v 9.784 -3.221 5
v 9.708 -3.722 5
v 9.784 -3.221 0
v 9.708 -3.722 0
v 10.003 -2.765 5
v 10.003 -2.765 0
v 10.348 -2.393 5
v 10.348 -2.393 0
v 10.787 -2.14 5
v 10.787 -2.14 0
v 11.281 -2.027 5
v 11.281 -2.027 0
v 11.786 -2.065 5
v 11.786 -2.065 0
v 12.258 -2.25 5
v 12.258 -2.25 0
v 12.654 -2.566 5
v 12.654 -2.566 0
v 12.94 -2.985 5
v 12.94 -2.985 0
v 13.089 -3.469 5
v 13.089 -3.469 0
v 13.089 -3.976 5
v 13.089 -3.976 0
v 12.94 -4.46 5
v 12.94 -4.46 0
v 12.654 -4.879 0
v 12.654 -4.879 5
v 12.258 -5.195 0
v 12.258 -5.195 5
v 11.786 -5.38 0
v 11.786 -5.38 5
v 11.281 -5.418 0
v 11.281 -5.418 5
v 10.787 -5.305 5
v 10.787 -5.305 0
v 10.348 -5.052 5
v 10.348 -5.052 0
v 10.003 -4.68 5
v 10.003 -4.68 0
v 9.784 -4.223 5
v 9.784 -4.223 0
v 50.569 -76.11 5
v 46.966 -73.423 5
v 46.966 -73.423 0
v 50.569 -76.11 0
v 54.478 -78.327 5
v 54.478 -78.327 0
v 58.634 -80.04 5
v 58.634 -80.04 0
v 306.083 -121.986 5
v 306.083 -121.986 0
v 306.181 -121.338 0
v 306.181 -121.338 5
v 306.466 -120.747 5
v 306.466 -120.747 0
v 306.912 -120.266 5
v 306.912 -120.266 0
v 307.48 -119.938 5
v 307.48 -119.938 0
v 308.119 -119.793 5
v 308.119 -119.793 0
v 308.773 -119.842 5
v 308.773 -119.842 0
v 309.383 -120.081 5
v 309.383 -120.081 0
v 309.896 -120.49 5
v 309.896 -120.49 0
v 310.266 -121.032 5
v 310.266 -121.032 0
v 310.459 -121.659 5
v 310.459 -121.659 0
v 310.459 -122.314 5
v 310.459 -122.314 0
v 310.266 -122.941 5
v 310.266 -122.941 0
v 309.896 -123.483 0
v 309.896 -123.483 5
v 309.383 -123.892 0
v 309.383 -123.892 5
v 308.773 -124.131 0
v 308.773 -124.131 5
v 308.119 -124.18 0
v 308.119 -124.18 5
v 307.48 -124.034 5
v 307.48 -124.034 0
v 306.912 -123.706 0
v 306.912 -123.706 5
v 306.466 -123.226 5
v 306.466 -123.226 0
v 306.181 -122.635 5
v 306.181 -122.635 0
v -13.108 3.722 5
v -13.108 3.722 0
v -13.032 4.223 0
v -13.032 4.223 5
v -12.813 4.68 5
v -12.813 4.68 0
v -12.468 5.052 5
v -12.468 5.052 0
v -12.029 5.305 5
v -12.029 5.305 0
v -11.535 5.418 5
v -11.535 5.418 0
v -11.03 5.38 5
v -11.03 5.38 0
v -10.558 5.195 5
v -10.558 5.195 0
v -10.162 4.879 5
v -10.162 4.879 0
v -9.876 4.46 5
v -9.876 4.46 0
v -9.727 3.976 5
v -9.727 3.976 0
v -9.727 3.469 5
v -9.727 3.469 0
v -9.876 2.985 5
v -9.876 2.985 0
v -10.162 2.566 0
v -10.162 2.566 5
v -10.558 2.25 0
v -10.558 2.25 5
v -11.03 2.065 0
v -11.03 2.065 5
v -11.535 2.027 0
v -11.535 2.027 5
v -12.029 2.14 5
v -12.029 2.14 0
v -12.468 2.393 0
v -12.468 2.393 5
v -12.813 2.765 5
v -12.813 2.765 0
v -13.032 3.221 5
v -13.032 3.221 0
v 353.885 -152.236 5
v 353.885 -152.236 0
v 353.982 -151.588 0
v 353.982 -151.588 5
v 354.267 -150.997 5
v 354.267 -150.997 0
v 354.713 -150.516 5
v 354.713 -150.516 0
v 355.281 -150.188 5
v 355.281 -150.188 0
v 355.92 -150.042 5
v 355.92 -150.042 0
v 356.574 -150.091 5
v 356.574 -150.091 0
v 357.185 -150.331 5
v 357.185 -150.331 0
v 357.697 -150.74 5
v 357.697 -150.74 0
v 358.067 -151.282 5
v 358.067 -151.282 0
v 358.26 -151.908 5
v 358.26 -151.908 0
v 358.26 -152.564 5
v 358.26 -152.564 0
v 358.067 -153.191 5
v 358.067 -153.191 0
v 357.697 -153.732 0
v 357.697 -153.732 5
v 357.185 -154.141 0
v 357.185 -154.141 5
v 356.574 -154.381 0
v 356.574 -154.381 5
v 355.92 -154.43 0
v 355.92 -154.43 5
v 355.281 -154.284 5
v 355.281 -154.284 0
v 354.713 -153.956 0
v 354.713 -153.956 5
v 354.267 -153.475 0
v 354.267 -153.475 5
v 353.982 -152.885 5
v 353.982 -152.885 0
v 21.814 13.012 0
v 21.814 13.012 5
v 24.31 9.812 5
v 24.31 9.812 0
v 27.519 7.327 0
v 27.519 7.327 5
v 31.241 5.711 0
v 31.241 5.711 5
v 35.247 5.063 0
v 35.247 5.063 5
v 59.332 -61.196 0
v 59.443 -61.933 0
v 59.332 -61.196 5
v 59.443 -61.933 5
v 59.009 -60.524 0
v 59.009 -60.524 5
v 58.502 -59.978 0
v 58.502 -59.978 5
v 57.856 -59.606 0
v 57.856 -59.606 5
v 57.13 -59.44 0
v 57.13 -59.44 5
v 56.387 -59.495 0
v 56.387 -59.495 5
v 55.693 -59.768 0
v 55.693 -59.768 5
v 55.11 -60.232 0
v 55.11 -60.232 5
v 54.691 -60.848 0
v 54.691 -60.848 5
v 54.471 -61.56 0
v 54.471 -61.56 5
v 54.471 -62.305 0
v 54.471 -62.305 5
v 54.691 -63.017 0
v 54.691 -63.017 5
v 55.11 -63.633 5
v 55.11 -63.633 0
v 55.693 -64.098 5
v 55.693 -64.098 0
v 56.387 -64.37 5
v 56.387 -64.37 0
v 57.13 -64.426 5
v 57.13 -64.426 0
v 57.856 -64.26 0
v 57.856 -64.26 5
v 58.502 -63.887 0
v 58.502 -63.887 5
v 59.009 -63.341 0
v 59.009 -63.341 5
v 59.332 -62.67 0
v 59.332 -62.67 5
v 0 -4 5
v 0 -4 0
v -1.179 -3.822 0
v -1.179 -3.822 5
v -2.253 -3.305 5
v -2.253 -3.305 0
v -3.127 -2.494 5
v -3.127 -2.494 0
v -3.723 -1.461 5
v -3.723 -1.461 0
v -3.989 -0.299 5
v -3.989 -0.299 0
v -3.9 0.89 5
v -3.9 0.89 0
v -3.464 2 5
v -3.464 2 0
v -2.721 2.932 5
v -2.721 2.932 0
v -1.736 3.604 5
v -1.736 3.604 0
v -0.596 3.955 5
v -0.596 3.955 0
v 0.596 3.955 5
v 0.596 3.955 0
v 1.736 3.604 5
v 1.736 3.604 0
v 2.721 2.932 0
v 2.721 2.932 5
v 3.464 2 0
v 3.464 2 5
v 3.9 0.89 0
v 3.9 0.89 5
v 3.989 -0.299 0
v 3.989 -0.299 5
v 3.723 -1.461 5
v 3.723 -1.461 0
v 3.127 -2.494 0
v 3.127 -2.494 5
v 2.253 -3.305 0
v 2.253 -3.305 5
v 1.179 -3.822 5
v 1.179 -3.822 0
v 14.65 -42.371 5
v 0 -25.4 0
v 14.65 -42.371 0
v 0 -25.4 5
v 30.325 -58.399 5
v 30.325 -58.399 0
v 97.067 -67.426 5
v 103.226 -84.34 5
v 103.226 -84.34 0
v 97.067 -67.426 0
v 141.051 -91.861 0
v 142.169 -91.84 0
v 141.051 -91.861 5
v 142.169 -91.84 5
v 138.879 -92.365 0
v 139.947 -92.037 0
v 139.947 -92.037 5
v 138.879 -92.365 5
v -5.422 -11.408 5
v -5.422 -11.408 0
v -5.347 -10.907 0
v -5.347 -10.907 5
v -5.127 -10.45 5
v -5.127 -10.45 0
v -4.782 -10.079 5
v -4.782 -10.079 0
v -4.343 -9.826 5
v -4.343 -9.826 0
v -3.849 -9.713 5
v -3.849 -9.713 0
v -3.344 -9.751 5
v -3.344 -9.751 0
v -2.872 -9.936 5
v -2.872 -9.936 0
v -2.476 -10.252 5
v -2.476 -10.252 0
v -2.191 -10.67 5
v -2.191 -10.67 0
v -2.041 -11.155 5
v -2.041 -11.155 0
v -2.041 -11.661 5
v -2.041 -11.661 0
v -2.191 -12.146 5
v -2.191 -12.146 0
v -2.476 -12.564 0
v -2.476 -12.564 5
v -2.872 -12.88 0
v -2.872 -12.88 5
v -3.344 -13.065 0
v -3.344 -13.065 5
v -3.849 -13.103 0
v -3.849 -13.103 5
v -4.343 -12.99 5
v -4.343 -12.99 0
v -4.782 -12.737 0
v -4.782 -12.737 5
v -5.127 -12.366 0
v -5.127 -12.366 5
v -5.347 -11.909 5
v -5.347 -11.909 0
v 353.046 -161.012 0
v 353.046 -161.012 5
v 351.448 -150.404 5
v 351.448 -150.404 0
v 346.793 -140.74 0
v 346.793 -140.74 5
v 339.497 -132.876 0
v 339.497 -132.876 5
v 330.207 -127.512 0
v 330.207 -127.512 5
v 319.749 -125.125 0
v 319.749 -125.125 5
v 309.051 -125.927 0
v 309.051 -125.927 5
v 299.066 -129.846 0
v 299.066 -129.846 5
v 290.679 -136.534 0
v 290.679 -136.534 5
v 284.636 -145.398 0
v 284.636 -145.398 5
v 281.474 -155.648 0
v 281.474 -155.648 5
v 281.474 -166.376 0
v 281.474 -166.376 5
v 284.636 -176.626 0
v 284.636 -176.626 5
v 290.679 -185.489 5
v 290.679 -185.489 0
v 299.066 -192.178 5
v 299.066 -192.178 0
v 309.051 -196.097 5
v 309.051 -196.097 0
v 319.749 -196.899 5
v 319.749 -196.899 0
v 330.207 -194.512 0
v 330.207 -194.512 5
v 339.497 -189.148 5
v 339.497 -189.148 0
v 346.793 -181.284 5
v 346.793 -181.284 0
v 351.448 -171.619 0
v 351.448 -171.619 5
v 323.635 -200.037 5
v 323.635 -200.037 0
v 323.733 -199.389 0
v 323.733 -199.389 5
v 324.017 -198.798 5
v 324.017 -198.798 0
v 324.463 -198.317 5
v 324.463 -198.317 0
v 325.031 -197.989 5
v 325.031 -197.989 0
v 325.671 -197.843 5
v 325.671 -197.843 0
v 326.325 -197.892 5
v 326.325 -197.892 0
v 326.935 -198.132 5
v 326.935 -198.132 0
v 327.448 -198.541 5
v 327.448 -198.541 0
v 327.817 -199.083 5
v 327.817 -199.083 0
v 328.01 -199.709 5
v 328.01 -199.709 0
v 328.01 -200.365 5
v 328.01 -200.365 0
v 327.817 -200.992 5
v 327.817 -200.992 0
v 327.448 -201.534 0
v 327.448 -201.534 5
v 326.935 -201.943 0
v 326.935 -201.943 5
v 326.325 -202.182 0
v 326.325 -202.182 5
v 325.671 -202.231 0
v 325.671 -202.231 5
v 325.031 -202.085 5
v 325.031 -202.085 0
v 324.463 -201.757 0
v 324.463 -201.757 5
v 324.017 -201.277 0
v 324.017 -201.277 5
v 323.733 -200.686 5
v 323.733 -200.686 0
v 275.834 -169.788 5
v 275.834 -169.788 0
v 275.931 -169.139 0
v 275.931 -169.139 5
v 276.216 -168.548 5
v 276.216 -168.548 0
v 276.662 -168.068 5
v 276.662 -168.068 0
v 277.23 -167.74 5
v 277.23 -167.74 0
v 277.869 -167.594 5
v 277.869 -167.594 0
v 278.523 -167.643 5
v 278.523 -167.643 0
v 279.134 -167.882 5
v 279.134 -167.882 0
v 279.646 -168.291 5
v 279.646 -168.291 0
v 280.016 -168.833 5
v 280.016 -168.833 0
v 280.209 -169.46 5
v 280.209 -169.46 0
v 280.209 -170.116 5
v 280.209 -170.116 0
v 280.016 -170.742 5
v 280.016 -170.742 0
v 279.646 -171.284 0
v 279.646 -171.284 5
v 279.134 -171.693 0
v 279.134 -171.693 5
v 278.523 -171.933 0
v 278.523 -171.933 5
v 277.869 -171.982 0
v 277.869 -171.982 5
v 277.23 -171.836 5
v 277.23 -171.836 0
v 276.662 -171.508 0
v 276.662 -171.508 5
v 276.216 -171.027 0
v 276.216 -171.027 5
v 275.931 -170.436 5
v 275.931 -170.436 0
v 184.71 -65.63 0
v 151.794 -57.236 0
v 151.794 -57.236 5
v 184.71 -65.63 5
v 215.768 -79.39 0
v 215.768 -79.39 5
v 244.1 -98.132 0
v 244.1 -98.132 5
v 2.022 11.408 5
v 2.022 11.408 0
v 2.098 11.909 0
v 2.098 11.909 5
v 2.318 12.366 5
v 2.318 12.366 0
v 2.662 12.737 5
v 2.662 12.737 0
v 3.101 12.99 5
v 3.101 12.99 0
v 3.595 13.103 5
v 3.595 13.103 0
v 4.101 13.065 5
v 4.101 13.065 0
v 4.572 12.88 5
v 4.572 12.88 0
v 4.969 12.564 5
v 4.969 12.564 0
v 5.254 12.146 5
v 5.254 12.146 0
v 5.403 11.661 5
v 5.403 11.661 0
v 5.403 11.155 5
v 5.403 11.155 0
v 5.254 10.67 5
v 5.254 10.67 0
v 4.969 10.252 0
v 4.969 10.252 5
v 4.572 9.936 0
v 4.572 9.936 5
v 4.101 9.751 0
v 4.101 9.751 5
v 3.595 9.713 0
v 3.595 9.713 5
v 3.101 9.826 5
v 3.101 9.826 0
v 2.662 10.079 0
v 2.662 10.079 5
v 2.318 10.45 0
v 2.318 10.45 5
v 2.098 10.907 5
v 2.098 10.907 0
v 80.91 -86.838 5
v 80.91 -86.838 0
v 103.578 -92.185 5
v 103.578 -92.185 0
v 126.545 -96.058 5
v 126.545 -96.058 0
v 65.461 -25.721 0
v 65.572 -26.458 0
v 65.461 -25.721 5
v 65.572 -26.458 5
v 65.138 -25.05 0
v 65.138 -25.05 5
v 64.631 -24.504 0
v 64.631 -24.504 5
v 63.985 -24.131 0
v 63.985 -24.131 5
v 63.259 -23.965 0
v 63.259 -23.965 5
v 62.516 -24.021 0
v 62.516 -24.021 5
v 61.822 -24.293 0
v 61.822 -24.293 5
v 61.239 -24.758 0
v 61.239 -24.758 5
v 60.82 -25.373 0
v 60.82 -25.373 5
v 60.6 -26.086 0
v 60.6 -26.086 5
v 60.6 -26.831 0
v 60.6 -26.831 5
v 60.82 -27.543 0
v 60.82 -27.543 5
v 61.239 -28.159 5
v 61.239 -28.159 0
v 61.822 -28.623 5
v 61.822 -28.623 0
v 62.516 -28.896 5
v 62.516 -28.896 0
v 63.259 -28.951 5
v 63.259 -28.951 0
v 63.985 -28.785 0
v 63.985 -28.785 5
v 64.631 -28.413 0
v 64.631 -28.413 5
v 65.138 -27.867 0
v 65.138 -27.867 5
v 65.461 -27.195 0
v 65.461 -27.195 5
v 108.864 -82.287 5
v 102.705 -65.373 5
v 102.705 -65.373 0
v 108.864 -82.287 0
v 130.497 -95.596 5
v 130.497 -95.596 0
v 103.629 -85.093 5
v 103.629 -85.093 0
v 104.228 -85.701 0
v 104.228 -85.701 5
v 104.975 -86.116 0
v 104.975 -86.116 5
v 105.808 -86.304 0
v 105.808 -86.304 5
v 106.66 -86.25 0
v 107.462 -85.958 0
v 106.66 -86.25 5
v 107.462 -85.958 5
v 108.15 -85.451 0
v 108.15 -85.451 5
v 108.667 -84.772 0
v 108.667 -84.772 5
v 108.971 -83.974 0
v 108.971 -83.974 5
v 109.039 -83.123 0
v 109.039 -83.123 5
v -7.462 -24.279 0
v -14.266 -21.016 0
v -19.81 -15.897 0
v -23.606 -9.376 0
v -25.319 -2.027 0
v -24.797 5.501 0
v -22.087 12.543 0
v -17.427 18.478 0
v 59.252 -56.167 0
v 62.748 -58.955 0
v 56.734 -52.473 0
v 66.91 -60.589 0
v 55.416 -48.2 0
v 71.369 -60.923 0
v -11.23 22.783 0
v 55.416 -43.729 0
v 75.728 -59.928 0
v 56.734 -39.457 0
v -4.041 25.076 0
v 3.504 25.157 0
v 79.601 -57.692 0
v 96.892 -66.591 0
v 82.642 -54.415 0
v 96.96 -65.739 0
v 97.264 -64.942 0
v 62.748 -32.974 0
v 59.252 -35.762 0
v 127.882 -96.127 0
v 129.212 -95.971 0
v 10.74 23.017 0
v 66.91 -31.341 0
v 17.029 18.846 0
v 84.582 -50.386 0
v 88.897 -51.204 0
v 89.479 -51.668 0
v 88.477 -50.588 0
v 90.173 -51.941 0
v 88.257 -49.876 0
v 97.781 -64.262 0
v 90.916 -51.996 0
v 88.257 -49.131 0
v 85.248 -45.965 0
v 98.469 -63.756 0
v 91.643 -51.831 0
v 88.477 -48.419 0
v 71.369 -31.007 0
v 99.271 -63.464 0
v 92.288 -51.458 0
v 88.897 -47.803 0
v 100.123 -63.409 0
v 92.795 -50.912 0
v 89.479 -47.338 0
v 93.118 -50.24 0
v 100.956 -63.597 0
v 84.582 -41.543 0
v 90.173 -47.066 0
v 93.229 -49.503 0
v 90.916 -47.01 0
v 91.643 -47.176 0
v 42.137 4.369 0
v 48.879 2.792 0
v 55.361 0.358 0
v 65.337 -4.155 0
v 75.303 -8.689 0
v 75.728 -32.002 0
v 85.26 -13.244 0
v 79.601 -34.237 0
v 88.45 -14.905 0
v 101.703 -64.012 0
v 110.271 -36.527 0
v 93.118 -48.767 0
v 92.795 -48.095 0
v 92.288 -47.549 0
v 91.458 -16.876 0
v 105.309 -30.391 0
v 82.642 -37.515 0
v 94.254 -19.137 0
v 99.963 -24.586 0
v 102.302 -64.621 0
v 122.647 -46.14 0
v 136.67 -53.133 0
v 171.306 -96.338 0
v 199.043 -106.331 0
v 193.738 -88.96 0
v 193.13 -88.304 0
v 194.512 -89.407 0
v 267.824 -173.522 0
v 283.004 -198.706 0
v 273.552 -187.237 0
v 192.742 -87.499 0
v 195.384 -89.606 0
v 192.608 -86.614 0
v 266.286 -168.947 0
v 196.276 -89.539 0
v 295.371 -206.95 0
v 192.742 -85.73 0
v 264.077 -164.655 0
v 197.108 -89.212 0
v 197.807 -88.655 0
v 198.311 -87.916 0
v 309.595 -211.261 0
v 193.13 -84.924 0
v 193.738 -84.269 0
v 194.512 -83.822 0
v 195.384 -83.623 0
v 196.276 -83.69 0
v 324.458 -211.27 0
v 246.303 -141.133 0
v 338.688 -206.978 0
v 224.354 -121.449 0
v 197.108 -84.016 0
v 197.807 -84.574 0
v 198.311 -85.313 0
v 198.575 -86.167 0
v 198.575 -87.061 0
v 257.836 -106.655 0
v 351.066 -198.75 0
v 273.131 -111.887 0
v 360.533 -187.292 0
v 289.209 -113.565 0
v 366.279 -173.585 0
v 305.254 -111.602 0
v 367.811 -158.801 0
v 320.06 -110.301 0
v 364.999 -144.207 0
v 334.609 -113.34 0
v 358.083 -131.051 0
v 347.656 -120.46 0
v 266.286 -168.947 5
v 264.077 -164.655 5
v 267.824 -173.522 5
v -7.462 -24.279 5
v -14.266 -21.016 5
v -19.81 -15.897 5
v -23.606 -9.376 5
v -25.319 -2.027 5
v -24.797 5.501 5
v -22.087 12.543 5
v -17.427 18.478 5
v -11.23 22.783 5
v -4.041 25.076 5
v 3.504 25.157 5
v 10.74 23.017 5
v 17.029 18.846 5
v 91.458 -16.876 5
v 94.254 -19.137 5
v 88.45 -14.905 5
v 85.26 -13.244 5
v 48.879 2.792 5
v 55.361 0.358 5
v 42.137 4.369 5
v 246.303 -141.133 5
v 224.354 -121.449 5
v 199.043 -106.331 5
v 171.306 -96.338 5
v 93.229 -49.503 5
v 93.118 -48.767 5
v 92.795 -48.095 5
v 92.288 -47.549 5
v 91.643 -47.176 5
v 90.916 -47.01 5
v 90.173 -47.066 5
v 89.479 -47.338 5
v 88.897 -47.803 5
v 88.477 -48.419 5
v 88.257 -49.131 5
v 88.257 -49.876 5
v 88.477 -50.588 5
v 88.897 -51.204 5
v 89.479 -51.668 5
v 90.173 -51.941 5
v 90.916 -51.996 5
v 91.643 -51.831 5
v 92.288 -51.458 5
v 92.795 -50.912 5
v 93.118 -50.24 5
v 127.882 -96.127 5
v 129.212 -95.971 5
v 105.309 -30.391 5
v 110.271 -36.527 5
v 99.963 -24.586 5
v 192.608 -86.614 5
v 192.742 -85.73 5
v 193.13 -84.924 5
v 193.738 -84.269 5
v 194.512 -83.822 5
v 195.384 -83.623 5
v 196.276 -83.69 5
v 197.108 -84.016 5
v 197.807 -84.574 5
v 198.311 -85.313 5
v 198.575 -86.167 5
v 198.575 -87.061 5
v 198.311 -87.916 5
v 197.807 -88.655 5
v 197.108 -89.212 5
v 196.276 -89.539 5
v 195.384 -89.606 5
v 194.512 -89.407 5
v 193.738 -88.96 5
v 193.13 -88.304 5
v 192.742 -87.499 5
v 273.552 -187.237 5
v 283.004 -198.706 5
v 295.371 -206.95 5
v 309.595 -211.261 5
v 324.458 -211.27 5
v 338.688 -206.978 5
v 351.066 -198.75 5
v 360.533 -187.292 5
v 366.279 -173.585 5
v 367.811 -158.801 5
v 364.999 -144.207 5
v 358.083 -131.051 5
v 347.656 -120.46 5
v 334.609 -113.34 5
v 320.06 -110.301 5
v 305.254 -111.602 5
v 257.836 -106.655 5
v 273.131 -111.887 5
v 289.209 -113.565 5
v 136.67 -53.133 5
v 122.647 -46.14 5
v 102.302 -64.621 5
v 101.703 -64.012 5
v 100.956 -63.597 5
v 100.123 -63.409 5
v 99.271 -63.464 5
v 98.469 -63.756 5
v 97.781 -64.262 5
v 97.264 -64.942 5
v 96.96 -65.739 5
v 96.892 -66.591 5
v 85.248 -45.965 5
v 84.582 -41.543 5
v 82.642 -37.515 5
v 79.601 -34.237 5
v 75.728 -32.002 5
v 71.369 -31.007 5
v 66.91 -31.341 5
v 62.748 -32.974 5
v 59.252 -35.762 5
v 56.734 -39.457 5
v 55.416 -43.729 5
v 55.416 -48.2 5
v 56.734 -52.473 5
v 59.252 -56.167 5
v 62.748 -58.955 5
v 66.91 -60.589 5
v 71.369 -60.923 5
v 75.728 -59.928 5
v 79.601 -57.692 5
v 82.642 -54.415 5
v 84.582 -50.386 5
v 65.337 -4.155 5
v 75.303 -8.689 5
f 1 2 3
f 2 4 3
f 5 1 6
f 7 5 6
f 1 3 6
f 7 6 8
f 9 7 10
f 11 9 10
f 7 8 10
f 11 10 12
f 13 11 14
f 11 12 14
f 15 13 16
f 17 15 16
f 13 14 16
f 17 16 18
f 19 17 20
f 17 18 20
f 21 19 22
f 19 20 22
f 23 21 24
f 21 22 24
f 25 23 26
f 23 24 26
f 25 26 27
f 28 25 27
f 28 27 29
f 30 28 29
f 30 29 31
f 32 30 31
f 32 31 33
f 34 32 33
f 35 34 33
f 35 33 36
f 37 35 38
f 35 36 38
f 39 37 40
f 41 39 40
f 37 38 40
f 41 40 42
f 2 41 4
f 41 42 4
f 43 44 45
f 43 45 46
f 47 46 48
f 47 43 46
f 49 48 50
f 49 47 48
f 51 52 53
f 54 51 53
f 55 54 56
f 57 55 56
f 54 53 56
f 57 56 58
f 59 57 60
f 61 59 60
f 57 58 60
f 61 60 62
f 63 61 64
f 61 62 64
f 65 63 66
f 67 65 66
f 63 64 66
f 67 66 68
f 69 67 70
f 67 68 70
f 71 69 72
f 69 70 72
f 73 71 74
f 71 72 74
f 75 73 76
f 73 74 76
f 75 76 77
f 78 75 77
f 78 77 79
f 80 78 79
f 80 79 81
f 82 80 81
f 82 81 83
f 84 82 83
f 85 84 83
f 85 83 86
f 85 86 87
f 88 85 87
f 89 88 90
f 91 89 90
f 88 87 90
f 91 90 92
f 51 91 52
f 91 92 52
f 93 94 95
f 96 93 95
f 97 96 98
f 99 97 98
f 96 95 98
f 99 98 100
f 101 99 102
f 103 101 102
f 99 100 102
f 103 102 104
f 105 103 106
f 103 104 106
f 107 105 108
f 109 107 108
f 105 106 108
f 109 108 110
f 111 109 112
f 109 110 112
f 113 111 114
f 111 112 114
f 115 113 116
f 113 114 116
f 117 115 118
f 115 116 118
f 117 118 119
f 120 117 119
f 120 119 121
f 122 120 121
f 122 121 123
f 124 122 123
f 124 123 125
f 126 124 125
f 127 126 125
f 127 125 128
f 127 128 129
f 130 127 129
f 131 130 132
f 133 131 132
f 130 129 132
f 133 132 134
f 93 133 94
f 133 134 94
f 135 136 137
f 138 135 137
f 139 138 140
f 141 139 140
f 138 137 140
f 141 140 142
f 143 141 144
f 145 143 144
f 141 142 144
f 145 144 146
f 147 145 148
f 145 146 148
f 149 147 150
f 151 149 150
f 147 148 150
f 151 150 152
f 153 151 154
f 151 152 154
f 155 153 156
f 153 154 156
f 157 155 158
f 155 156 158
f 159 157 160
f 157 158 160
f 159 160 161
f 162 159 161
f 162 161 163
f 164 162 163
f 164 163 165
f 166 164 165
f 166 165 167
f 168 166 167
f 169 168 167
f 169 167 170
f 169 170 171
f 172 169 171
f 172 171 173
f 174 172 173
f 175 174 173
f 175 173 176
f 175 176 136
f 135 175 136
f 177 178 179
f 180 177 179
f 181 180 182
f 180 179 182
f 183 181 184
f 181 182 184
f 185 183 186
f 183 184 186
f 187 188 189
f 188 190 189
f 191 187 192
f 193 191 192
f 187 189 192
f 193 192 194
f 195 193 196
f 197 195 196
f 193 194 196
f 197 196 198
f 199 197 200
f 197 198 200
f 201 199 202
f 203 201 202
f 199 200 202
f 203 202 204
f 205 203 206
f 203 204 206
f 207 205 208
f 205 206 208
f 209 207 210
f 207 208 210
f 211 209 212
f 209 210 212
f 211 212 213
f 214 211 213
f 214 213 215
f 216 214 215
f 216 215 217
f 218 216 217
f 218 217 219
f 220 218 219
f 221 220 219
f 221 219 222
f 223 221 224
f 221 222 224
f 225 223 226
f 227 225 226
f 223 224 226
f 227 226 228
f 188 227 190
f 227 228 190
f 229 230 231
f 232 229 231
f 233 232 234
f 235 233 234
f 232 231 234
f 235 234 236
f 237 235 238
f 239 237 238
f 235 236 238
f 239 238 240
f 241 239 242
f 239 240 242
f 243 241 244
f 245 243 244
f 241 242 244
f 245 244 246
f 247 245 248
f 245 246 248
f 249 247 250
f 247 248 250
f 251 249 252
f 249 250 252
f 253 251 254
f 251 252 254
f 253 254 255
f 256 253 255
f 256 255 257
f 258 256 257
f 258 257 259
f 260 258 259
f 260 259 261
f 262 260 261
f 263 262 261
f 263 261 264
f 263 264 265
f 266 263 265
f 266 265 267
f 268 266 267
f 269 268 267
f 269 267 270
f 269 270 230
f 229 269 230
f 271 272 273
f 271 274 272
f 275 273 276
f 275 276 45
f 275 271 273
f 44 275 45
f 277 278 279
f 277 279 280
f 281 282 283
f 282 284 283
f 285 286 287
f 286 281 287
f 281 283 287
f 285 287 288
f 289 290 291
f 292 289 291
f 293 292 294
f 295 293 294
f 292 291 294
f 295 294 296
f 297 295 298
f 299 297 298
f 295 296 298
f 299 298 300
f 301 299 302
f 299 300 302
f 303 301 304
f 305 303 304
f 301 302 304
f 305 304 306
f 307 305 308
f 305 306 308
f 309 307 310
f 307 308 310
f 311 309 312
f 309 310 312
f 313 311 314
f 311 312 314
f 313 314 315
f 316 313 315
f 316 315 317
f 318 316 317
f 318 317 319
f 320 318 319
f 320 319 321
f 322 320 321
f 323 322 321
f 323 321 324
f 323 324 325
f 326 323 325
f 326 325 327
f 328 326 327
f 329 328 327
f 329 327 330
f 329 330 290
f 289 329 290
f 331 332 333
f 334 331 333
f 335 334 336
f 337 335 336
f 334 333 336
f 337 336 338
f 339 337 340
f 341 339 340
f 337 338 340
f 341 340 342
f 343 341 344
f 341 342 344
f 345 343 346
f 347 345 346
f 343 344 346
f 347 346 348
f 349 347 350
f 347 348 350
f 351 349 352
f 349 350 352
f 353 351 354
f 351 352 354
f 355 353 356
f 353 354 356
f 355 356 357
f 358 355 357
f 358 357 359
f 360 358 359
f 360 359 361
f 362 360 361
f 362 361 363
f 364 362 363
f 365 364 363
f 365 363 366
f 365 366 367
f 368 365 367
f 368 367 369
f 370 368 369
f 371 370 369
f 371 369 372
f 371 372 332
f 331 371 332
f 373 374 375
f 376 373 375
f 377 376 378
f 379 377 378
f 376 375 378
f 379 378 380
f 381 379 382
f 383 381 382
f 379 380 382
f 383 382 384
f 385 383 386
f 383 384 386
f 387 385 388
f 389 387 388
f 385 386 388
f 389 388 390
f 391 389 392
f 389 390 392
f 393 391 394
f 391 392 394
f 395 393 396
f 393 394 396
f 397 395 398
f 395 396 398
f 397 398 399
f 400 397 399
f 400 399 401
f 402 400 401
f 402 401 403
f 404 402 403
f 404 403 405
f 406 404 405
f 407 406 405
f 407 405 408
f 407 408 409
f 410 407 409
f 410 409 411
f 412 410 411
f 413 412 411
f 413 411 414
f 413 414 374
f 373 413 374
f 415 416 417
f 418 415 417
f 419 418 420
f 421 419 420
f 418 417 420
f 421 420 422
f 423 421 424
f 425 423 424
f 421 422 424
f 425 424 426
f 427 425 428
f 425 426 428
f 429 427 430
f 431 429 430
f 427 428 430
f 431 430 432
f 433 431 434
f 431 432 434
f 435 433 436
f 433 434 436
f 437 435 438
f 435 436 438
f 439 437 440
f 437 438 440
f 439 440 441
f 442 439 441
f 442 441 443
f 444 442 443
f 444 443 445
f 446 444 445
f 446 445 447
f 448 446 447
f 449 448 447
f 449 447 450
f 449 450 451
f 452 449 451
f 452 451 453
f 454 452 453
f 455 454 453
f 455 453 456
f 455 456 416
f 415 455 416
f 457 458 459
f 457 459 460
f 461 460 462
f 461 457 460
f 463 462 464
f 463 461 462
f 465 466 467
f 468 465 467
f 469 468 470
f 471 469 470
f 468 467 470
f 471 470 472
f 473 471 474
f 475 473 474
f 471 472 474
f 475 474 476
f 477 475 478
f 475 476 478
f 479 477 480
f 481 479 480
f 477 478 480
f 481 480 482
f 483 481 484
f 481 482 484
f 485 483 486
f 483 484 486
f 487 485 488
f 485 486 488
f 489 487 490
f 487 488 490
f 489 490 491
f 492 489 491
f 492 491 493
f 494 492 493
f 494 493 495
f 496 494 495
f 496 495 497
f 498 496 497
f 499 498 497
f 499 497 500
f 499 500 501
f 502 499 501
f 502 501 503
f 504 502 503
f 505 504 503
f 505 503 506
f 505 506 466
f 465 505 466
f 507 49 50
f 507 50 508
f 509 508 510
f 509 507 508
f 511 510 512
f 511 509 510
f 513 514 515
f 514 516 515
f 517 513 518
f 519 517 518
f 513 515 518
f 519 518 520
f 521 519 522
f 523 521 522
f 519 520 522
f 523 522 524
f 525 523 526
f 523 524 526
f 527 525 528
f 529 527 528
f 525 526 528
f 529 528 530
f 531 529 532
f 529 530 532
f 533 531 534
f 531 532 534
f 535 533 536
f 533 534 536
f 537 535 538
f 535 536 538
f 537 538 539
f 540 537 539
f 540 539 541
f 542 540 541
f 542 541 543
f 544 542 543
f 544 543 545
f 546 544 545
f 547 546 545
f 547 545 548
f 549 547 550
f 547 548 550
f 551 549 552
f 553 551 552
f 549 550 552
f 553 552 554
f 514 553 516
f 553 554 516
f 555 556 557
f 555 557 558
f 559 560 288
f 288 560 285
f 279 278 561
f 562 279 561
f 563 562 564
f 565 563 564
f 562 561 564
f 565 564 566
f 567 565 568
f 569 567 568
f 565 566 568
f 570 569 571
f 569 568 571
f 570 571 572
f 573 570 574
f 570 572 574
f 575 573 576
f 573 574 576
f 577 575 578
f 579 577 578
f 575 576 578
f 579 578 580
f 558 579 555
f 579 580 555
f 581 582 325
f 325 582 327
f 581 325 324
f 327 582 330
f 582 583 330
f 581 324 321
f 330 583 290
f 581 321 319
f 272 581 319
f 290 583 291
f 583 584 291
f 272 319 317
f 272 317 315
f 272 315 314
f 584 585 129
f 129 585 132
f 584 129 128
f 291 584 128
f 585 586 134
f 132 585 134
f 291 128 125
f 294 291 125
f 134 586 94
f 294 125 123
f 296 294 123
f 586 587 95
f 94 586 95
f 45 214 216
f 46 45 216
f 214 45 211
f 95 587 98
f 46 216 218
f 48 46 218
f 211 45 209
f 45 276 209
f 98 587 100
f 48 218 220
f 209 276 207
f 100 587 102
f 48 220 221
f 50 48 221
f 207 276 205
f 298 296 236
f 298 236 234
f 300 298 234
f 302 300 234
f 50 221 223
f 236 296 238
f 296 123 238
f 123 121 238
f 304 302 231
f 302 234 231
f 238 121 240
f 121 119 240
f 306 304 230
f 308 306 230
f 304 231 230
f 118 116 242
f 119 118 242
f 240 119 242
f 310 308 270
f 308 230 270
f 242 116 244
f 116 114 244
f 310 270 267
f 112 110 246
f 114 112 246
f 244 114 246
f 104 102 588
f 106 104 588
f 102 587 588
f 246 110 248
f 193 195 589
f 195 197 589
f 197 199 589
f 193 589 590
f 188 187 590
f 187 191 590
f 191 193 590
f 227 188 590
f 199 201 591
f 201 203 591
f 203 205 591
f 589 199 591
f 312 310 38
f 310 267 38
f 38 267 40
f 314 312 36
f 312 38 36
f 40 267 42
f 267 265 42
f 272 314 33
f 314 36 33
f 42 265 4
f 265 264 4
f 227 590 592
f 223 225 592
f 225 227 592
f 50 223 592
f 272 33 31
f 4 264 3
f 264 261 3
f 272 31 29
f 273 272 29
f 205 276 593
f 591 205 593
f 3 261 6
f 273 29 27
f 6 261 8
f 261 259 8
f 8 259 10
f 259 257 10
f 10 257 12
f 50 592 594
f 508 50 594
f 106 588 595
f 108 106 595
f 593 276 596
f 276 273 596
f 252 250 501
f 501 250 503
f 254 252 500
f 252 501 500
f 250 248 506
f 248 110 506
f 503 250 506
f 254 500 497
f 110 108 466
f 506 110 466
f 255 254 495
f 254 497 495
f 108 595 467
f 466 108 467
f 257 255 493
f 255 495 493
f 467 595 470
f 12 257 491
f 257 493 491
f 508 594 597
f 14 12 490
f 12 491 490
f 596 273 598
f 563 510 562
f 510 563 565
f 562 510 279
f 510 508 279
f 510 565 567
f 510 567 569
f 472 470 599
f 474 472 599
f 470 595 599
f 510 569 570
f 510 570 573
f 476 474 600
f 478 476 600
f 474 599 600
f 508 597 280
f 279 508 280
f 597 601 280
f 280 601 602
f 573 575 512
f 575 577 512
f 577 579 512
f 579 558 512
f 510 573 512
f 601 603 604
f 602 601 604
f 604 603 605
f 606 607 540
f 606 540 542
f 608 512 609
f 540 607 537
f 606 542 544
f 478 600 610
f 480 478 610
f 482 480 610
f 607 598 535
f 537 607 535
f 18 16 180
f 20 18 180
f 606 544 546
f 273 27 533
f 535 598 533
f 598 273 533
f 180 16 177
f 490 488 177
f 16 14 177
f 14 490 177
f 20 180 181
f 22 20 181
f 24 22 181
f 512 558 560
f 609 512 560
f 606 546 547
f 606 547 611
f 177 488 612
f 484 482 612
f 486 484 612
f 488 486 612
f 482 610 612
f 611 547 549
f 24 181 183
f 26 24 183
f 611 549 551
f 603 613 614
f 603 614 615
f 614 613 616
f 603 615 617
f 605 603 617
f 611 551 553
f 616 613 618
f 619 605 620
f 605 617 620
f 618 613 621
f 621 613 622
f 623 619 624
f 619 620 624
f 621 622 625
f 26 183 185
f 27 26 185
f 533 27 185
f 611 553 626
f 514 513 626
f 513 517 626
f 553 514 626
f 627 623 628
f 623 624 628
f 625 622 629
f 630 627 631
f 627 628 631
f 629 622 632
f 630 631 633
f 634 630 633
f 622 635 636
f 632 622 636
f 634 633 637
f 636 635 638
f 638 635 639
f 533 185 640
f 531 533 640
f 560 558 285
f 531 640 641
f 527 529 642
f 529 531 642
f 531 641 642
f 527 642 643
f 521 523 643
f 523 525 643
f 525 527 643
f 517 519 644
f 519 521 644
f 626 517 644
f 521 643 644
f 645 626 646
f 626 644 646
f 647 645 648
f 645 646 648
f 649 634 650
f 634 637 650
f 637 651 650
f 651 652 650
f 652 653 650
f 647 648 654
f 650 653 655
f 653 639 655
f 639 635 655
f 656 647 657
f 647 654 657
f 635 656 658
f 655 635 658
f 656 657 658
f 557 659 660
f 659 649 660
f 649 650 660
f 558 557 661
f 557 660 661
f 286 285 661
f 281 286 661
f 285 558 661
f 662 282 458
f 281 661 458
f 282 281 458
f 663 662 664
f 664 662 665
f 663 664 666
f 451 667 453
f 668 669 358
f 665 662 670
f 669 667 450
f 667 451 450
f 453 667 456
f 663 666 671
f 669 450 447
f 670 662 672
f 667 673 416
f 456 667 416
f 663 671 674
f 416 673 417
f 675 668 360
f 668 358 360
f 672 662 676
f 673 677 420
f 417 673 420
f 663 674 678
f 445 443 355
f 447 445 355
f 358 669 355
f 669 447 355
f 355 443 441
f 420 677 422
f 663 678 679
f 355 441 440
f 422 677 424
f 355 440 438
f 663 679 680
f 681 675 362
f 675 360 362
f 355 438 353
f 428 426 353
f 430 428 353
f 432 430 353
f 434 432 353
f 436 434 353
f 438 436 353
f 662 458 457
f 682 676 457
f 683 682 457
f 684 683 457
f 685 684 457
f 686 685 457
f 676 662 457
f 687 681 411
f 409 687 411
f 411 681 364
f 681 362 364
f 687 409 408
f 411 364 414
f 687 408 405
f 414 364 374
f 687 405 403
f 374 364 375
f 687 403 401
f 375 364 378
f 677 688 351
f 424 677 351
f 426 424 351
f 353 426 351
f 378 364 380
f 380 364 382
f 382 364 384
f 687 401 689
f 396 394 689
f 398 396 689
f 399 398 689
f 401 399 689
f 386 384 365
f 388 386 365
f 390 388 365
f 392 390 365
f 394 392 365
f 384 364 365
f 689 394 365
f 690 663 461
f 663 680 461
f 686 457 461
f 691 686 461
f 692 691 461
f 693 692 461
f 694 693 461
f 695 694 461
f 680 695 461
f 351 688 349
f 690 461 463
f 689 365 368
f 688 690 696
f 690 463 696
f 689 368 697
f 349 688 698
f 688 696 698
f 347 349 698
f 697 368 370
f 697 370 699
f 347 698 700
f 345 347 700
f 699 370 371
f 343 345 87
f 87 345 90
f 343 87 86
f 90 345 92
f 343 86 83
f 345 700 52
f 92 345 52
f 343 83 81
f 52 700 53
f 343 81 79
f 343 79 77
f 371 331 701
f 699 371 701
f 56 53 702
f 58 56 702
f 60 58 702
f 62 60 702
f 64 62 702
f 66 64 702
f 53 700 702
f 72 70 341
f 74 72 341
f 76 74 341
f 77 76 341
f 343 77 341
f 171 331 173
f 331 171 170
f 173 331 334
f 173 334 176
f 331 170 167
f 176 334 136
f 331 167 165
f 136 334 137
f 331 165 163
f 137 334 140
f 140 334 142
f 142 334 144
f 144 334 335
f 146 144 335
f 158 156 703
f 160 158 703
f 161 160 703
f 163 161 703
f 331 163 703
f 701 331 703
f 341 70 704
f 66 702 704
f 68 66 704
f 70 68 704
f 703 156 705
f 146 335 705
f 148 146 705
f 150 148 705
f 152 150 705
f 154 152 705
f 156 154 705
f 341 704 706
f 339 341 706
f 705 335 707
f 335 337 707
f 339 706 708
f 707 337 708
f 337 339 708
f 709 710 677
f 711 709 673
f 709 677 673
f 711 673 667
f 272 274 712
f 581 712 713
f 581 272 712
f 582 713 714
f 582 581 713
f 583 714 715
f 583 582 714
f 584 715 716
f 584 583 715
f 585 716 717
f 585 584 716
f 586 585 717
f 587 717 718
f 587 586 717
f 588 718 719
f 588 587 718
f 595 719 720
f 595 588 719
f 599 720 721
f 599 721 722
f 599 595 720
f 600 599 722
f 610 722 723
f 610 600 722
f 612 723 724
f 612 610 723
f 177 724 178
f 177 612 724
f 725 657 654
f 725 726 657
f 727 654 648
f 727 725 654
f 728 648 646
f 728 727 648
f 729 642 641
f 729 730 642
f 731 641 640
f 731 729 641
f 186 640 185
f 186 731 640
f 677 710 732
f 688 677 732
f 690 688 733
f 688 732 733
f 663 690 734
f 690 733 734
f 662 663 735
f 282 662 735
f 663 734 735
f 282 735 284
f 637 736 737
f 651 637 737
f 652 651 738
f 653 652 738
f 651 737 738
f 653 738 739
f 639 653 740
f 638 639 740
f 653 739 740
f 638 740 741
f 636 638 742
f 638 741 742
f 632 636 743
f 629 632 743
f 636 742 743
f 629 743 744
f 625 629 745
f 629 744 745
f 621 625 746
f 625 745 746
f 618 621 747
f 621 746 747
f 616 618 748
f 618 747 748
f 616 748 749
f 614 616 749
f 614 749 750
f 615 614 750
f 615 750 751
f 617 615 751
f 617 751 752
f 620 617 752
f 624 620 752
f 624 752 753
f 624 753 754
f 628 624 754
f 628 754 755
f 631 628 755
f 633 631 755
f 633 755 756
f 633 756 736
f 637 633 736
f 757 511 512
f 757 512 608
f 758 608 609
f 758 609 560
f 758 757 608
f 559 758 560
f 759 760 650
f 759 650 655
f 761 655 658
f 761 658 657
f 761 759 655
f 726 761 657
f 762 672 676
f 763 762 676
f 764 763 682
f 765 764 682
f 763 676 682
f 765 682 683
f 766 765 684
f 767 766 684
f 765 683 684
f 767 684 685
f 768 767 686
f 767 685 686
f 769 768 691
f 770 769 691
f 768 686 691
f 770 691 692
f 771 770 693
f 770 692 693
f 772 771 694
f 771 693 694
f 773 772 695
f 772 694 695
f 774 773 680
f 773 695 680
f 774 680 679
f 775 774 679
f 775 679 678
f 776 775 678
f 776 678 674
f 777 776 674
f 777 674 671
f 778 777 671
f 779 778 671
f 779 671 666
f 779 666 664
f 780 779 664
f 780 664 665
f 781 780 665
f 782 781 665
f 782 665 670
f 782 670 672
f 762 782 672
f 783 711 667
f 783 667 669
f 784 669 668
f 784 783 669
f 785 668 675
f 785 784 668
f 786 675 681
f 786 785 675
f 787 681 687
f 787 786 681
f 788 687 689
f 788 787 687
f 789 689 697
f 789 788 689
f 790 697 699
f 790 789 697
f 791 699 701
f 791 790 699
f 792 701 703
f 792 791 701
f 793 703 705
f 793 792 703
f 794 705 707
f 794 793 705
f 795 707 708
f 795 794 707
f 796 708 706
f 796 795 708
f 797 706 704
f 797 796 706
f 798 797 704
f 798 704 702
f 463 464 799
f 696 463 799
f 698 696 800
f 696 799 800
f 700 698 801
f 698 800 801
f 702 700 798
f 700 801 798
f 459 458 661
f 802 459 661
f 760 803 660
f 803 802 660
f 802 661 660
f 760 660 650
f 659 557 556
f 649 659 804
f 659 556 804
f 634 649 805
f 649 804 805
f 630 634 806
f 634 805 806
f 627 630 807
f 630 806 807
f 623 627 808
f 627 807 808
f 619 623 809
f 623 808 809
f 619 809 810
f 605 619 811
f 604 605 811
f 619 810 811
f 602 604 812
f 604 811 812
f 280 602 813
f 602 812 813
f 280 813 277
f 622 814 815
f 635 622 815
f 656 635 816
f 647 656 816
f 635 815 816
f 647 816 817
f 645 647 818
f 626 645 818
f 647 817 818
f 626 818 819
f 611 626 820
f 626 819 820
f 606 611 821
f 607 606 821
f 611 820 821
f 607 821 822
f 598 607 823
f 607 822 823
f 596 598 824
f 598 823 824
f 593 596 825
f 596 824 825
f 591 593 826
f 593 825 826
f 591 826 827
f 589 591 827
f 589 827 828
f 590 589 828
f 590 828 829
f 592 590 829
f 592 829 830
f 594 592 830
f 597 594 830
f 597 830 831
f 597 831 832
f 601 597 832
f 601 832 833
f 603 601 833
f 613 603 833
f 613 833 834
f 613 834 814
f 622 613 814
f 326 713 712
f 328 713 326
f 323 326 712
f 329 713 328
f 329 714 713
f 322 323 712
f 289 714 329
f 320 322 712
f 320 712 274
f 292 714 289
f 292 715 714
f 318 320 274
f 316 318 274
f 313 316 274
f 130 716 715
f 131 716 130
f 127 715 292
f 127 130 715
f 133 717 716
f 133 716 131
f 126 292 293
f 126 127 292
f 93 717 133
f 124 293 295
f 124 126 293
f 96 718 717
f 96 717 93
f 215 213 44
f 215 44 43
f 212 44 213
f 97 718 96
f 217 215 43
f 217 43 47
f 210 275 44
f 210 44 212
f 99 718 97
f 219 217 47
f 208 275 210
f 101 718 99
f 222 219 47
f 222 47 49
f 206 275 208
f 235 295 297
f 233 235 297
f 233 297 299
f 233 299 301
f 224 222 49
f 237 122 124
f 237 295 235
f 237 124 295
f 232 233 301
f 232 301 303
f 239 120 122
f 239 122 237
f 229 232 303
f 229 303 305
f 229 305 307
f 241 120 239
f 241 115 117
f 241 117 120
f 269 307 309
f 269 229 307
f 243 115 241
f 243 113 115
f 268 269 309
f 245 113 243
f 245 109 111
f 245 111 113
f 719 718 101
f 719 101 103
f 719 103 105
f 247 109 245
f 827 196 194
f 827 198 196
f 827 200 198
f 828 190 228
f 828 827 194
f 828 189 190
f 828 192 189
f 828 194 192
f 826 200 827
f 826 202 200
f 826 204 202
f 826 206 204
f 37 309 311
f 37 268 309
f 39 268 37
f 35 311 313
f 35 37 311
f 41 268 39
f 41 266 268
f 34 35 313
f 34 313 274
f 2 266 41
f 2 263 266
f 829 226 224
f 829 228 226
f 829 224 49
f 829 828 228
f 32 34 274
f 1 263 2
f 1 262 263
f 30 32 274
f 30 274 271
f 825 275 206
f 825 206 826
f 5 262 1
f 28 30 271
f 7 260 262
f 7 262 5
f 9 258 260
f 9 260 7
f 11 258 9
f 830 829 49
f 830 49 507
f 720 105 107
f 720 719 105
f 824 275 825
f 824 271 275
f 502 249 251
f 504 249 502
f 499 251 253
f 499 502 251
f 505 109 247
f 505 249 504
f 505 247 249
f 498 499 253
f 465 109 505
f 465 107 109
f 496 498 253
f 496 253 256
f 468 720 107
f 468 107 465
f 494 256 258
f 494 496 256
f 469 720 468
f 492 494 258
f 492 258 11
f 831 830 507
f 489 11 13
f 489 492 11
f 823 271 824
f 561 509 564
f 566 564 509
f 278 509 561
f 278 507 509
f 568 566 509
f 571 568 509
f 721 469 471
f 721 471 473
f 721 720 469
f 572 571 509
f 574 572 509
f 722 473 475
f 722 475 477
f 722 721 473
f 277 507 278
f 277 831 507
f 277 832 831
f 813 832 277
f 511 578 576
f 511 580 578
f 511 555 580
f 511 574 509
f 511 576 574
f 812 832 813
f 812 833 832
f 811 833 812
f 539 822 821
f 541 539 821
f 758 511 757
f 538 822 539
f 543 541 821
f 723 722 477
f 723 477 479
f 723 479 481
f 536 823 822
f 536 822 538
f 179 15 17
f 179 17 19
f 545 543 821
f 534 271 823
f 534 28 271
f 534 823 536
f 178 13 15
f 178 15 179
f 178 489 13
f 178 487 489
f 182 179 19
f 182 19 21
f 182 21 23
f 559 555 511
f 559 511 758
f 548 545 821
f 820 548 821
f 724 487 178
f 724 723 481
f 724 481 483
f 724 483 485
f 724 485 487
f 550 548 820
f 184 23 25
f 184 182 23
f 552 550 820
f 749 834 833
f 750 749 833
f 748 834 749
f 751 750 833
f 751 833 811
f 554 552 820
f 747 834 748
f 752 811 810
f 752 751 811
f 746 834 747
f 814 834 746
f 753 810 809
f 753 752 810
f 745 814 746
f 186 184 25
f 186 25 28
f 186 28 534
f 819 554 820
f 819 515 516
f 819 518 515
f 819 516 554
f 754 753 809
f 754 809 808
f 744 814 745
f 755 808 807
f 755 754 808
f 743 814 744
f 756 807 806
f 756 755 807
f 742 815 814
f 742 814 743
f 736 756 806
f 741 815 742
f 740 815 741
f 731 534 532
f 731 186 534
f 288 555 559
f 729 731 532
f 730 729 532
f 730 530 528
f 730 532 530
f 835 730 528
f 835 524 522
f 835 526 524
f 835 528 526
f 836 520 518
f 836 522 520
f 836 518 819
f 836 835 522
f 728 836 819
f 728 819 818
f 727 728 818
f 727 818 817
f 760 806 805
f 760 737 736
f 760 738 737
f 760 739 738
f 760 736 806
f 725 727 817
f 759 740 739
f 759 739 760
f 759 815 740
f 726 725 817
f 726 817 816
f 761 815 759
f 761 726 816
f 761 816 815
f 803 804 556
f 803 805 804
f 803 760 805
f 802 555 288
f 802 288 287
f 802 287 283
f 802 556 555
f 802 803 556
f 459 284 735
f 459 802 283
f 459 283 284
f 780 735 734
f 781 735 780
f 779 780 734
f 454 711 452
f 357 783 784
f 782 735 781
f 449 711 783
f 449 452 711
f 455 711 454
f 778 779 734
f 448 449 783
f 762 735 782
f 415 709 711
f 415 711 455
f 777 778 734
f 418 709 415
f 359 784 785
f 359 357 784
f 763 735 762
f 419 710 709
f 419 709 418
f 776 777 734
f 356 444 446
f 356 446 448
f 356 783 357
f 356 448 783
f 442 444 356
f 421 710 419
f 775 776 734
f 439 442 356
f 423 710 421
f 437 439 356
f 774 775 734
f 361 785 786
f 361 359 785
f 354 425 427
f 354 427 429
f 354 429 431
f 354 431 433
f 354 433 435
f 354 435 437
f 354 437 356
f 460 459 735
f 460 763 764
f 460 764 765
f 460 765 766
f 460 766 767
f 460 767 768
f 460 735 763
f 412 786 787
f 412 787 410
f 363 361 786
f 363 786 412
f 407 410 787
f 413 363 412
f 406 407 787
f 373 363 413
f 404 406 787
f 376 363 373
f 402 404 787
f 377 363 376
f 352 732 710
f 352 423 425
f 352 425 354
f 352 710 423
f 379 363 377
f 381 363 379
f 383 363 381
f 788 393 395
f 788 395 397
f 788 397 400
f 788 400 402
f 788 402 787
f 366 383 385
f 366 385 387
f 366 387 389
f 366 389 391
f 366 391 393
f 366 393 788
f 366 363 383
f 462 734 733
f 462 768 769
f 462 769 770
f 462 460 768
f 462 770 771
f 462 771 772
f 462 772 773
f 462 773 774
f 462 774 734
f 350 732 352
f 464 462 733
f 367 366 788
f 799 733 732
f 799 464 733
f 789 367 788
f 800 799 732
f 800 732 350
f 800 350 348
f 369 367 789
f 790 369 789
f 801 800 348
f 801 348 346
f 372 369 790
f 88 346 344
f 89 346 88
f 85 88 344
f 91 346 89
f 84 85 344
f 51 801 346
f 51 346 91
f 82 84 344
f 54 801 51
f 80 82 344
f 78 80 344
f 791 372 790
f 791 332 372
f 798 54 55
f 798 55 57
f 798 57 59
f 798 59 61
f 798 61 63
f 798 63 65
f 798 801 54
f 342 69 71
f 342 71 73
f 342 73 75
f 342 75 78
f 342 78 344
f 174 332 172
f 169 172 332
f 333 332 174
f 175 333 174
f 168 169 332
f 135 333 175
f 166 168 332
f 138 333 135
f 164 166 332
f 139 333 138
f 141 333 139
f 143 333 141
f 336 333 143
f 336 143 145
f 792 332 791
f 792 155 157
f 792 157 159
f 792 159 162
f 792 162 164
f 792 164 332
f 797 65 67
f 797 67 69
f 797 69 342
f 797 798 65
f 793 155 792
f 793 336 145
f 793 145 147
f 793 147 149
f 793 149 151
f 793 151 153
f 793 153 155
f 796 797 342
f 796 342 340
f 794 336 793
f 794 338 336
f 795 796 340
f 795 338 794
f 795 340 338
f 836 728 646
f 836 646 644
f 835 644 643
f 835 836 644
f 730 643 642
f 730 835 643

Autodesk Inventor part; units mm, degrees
ref_plane "YZ Plane" through (0, 0, 0) normal (1, 0, 0) x (0, 1, 0)
ref_plane "XZ Plane" through (0, 0, 0) normal (0, 1, 0) x (-1, 0, 0)
ref_plane "XY Plane" through (0, 0, 0) normal (0, 0, 1) x (1, 0, 0)
sketch "Base" plane through (0, 0, 0) normal (0, 0, 1) x (1, 0, 0)
  circle A0 centre (0, 0) radius 25.4
  arc A1 (296.4611, -175.8738) -> (140.4514, -91.7589) centre (131.6761, -294.7694) ccw
  arc A2 (110.2711, -36.5273) -> (55.3611, 0.3584) centre (-26.1088, -180.2356) ccw
  arc A3 (110.2711, -36.5273) -> (151.7939, -57.2356) centre (164.9104, 21.0482) ccw
  arc A4 (244.1, -98.1325) -> (151.7939, -57.2356) centre (118.2154, -257.642) ccw
  arc A5 (244.1, -98.1325) -> (322.9398, -136.302) centre (369.9847, 61.3771) ccw
  arc A6 (339.7063, -172.5127) -> (322.9398, -136.302) centre (317.0592, -161.0119) ccw
  arc A7 (296.4611, -175.8738) -> (339.7063, -172.5127) centre (317.0592, -161.0119) ccw
  line L0 (128.6011, -96.3262) -> (140.4514, -91.7589)
  line L1 (0, 0) -> (317.0592, -161.0119) construction
  circle A8 centre (317.0592, -161.0119) radius 25.4 construction
  arc A9 (0, -25.4) -> (128.6011, -96.3262) centre (153.166, 100.265) ccw
  line L2 (0, 0) -> (0, -25.4) construction
  arc A10 (55.3611, 0.3584) -> (42.3326, -1.2004) centre (50.1387, -11.2181) ccw
  arc A11 (25.4, -0.0141) -> (42.3326, -1.2004) centre (34.5266, 8.8174) ccw
  line L3 (110.2711, -36.5273) -> (102.4101, -52.0068) construction
  line L4 (50.1387, -11.2181) -> (44.3883, -22.5417) construction
  line L5 (140.4514, -91.7589) -> (148.7008, -75.5146) construction
  line L6 (244.1, -98.1325) -> (233.6726, -118.6658) construction
  line L7 (339.7063, -172.5127) -> (317.0592, -161.0119) construction
  dimension "d101" = 50.8
  dimension "d98" = 355.6
  dimension "d99" = 203.2
  dimension "d100" = 79.375
  dimension "d102" = 198.12
  dimension "d103" = 50.8
  dimension "d104" = 12.7
  dimension "d105" = 203.2
  dimension "d106" = 48
  dimension "d107" = 12.7
  dimension "d108" = 12.7
  dimension "d109" = 23.495
  dimension "d111" = 158.75
  dimension "d112" = 222.25
  dimension "d113" = 49.784
  dimension "d114" = 65.0748
  dimension "d115" = 51.9176
  dimension "d116" = 95.3008
  dimension "d117" = 93.5228
extrude "Plate1" add sketch "Base" along normal blind 5
sketch "MountHoles" plane through (0, 0, 5) normal (0, 0, 1) x (1, 0, 0)
  arc A0 (296.4611, -175.8738) -> (322.9398, -136.302) centre (317.0592, -161.0119) ccw projected
  circle A1 centre (317.0592, -161.0119) radius 3.175
  circle A2 centre (0, 0) radius 3.175
  circle A3 centre (0, 0) radius 15.875 construction
  circle A4 centre (0, 15.875) radius 3.175
  line L0 (0, 15.875) -> (0, 0) construction
  circle A5 centre (-13.7482, 7.9375) radius 3.175
  circle A6 centre (-13.7482, -7.9375) radius 3.175
  circle A7 centre (0, -15.875) radius 3.175
  circle A8 centre (13.7482, -7.9375) radius 3.175
  circle A9 centre (13.7482, 7.9375) radius 3.175
  point P0 (278.6053, -195.7416)
  point P1 (14.9365, 6.9557)
  dimension "d40" = 31.75
  dimension "d38" = 6.35
  dimension "d39" = 6.35
  dimension "d43" = 360
hole "MountHolesFeature" at (0, 0, 5) direction (0, 0, -1) diameter 8 end through all
fillet "SmallFilletsFeature" radius 8 2 edges at (140.4514, -91.7589, 2.5) (128.6011, -96.3262, 2.5)
sketch "WheelMountHole" plane through (0, 0, 5) normal (0, 0, 1) x (1, 0, 0)
  arc A0 (296.4611, -175.8738) -> (322.9398, -136.302) centre (317.0592, -161.0119) ccw projected
  circle A1 centre (317.0592, -161.0119) radius 6.35
  point P0 (0, 0)
  point P1 (278.6053, -195.7416)
  dimension "d83" = 12.7
hole "WheelMountHoleFeature" at (317.0592, -161.0119, 5) direction (0, 0, -1) diameter 24.5 end through all
sketch "PistonMountHole" plane through (0, 0, 0) normal (0, 0, -1) x (-1, 0, 0)
  circle A0 centre (-195.6083, -86.6143) radius 3
  arc A1 (-151.7939, -57.2356) -> (-244.1, -98.1325) centre (-118.2154, -257.642) ccw projected
  line L0 (-206.4619, -74.6043) -> (-184.7548, -98.6243) construction
  arc A2 (-142.169, -91.8405) -> (-296.4611, -175.8738) centre (-131.6761, -294.7694) ccw projected
  point P0 (0, 0)
  dimension "d120" = 6
  dimension "d122" = 203.2
  dimension "d197" = 77.3929
extrude "PistonMountHoleFeature" cut sketch "PistonMountHole" against normal blind 5
sketch "MotorExtend" plane through (0, 0, 5) normal (0, 0, 1) x (1, 0, 0)
  circle A0 centre (70.2482, -45.9648) radius 36
  arc A1 (0, -25.4) -> (126.5447, -96.0583) centre (153.166, 100.265) ccw construction
  arc A2 (110.2711, -36.5273) -> (151.7939, -57.2356) centre (164.9104, 21.0482) ccw construction
  circle A3 centre (0, 0) radius 4
  line L0 (0, 0) -> (140.4963, -91.9296) construction
  arc A4 (142.169, -91.8405) -> (138.8789, -92.365) centre (141.7559, -99.8298) ccw
  arc A5 (0, -25.4) -> (46.966, -73.4228) centre (280.2614, 201.7164) ccw
  arc A6 (126.5447, -96.0583) -> (130.4966, -95.5956) centre (127.6196, -88.1308) ccw
  arc A7 (58.6335, -80.0397) -> (126.5447, -96.0583) centre (175.0163, 261.4034) ccw
  arc A8 (55.3611, 0.3584) -> (42.3326, -1.2004) centre (50.1387, -11.2181) ccw
  arc A9 (85.2601, -13.2441) -> (55.3611, 0.3584) centre (-2070.8473, -4712.7994) ccw
  arc A10 (110.2711, -36.5273) -> (55.3611, 0.3584) centre (-26.1088, -180.2356) ccw
  arc A11 (110.2711, -36.5273) -> (94.2542, -19.1374) centre (12.4591, -110.5454) ccw
  line L1 (0, -25.4) -> (55.3611, 0.3584)
  line L2 (110.2711, -36.5273) -> (126.5447, -96.0583)
  point P0 (70.2482, -45.9648)
  dimension "d128" = 72
sheet face with bend "MotorExtendFeature" sketch "MotorExtend" thickness 5 toward (0, 0, -1) bend radius 5 contours A0 A10 | A11 A10 A0 | A0 A10 A9 | A10 L2 A7 A0 | A0 A10 | A0 A5 L1 A10
bend "Bend1"
sketch "MotorCut" plane through (0, 0, 5) normal (0, 0, 1) x (1, 0, 0)
  circle A0 centre (70.2482, -45.9648) radius 36 projected
  circle A1 centre (70.2482, -45.9648) radius 15
  point P0 (0, 0)
  dimension "d134" = 30
extrude "MotorCutFeature" cut sketch "MotorCut" against normal blind 5 contours A1
sketch "MotorMountHoles" plane through (0, 0, 5) normal (0, 0, 1) x (1, 0, 0)
  circle A0 centre (56.943, -61.9327) radius 3.5 construction
  circle A1 centre (63.0721, -26.4582) radius 3.5 construction
  circle A2 centre (90.7293, -49.5034) radius 3.5 construction
  circle A3 centre (63.0721, -26.4582) radius 2.5
  circle A4 centre (90.7293, -49.5034) radius 2.5
  circle A5 centre (56.943, -61.9327) radius 2.5
  point P0 (0, 0)
  dimension "d180" = 5
extrude "MotorMountHolesFeature" cut sketch "MotorMountHoles" against normal blind 5
sketch "HubCoverExtend" plane through (0, 0, 5) normal (0, 0, 1) x (1, 0, 0)
  circle A0 centre (317.0592, -161.0119) radius 12.25
  circle A1 centre (317.0592, -161.0119) radius 50.8
  arc A2 (244.1, -98.1325) -> (322.9398, -136.302) centre (369.9847, 61.3771) ccw
  arc A3 (296.4611, -175.8738) -> (142.169, -91.8405) centre (131.6761, -294.7694) ccw
  arc A4 (244.1, -98.1325) -> (305.2545, -111.6025) centre (288.573, -41.7804) ccw
  arc A5 (266.9914, -169.606) -> (228.8665, -116.3198) centre (192.9202, -182.3202) ccw
  point P0 (0, 0)
  point P1 (283.7795, -122.6308)
  point P2 (268.8853, -144.8899)
  dimension "d139" = 101.6
sheet face with bend "HubCoverExtendFeature" sketch "HubCoverExtend" thickness 5 toward (0, 0, -1) bend radius 5
bend "Bend2"
sketch "HubPressFitHole" plane through (0, 0, 5) normal (0, 0, 1) x (1, 0, 0)
  circle A0 centre (317.0592, -161.0119) radius 12.25 projected
  circle A1 centre (317.0592, -161.0119) radius 35.9873
  point P0 (0, 0)
  dimension "d145" = 71.9746
extrude "HubPressFitHoleFeature" cut sketch "HubPressFitHole" against normal blind 5 contours A0 | A1
sketch "ShinThicken" plane through (0, 0, 5) normal (0, 0, 1) x (1, 0, 0)
  arc A0 (266.9914, -169.606) -> (228.8665, -116.3198) centre (192.9202, -182.3202) ccw
  arc A1 (228.8665, -116.3198) -> (142.169, -91.8405) centre (131.6761, -294.7694) ccw
  arc A2 (266.9914, -169.606) -> (142.169, -91.8405) centre (133.4629, -244.8745) ccw
  point P0 (0, 0)
sheet face with bend "ShinThickenFeature" sketch "ShinThicken" thickness 5 toward (0, 0, -1) bend radius 5
bend "Bend3"
fillet "BlendFilletFeature" radius 32 1 edges at (266.9914, -169.606, 2.5)
sketch "MotorMountExtension" plane through (0, 0, 5) normal (0, 0, 1) x (1, 0, 0)
  arc A0 (55.3611, 0.3584) -> (42.3326, -1.2004) centre (50.1387, -11.2181) ccw
  arc A1 (55.3611, 0.3584) -> (35.2473, 5.0627) centre (33.3341, -48.4687) ccw
  arc A2 (25.4, -0.0141) -> (0, -25.4) centre (0, 0) ccw
  arc A3 (21.8139, 13.0121) -> (35.2473, 5.0627) centre (35.8302, 21.3728) ccw
  arc A4 (85.2601, -13.2441) -> (55.3611, 0.3584) centre (-2070.8473, -4712.7994) ccw
  arc A5 (25.4, -0.0141) -> (42.3326, -1.2004) centre (34.5266, 8.8174) ccw
sheet face with bend "MotorMountExtensionFeature" sketch "MotorMountExtension" thickness 5 toward (0, 0, -1) bend radius 5
bend "Bend4"
sketch "HubMountHoles" plane through (0, 0, 0) normal (0, 0, -1) x (-1, 0, 0)
  circle A0 centre (3.7224, -11.408) radius 2 construction
  circle A1 centre (11.408, 3.7224) radius 2 construction
  circle A2 centre (-11.408, -3.7224) radius 2 construction
  circle A3 centre (-3.7224, 11.408) radius 2 construction
  circle A4 centre (-3.7224, 11.408) radius 1.7
  circle A5 centre (-11.408, -3.7224) radius 1.7
  circle A6 centre (3.7224, -11.408) radius 1.7
  circle A7 centre (11.408, 3.7224) radius 1.7
  point P0 (0, 0)
  dimension "d190" = 4
  dimension "d191" = 3.4
  dimension "d192" = 3.4
  dimension "d193" = 3.4
  dimension "d194" = 3.4
extrude "HubMountHolesFeature" cut sketch "HubMountHoles" against normal blind 5
sketch "EncoderMountHoles" plane through (0, 0, 0) normal (0, 0, -1) x (-1, 0, 0)
  circle A0 centre (-278.0337, -169.7877) radius 2.2 projected
  circle A1 centre (-308.2834, -121.9864) radius 2.2 projected
  circle A2 centre (-356.0846, -152.2361) radius 2.2 projected
  circle A3 centre (-325.835, -200.0373) radius 2.2 projected
  point P0 (0, 0)
extrude "EncoderMountHolesFeature" cut sketch "EncoderMountHoles" against normal blind 5
sketch "RollerGuideHole" plane through (0, 0, 5) normal (0, 0, 1) x (1, 0, 0)
  line L0 (99.8861, -66.3999) -> (106.0449, -83.3135) construction
  line L1 (102.705, -65.3734) -> (108.8638, -82.287)
  line L2 (103.2259, -84.3399) -> (97.0672, -67.4263)
  arc A0 (102.705, -65.3734) -> (97.0672, -67.4263) centre (99.8861, -66.3999) ccw
  arc A1 (103.2259, -84.3399) -> (108.8638, -82.287) centre (106.0449, -83.3135) ccw
  arc A2 (126.5447, -96.0583) -> (130.4966, -95.5956) centre (127.6196, -88.1308) ccw projected
  circle A3 centre (70.2482, -45.9648) radius 15 projected
  circle A4 centre (0, 0) radius 4 projected
  line L3 (0, 0) -> (70.2482, -45.9648) construction
  circle A5 centre (317.0592, -161.0119) radius 35.9873 projected
  line L4 (317.0592, -161.0119) -> (70.2482, -45.9648) construction
  point P0 (102.9655, -74.8567)
  point P1 (128.5499, -96.0766)
  dimension "d200" = 3
  dimension "d205" = 18
  dimension "d206" = 45
  dimension "d207" = 6
  dimension "d208" = 36
extrude "RollerGuideHoleFeature" cut sketch "RollerGuideHole" against normal blind 5 contours L1 A1 L2 A0
equation "\"d66\" = Thickness"
equation "\"d89\" = Thickness"
equation "\"d37\" = Thickness"
equation "\"BendRadius\" = Thickness"
equation "\"BendReliefWidth\" = Thickness"
equation "\"BendReliefDepth\" = 0.5 * Thickness"
equation "\"TransitionRadius\" = BendRadius"
equation "\"JacobiRadiusSize\" = BendRadius"
equation "\"GapSize\" = Thickness"
equation "\"Thickness\" = 5"
properties part number "LowerLeg"
